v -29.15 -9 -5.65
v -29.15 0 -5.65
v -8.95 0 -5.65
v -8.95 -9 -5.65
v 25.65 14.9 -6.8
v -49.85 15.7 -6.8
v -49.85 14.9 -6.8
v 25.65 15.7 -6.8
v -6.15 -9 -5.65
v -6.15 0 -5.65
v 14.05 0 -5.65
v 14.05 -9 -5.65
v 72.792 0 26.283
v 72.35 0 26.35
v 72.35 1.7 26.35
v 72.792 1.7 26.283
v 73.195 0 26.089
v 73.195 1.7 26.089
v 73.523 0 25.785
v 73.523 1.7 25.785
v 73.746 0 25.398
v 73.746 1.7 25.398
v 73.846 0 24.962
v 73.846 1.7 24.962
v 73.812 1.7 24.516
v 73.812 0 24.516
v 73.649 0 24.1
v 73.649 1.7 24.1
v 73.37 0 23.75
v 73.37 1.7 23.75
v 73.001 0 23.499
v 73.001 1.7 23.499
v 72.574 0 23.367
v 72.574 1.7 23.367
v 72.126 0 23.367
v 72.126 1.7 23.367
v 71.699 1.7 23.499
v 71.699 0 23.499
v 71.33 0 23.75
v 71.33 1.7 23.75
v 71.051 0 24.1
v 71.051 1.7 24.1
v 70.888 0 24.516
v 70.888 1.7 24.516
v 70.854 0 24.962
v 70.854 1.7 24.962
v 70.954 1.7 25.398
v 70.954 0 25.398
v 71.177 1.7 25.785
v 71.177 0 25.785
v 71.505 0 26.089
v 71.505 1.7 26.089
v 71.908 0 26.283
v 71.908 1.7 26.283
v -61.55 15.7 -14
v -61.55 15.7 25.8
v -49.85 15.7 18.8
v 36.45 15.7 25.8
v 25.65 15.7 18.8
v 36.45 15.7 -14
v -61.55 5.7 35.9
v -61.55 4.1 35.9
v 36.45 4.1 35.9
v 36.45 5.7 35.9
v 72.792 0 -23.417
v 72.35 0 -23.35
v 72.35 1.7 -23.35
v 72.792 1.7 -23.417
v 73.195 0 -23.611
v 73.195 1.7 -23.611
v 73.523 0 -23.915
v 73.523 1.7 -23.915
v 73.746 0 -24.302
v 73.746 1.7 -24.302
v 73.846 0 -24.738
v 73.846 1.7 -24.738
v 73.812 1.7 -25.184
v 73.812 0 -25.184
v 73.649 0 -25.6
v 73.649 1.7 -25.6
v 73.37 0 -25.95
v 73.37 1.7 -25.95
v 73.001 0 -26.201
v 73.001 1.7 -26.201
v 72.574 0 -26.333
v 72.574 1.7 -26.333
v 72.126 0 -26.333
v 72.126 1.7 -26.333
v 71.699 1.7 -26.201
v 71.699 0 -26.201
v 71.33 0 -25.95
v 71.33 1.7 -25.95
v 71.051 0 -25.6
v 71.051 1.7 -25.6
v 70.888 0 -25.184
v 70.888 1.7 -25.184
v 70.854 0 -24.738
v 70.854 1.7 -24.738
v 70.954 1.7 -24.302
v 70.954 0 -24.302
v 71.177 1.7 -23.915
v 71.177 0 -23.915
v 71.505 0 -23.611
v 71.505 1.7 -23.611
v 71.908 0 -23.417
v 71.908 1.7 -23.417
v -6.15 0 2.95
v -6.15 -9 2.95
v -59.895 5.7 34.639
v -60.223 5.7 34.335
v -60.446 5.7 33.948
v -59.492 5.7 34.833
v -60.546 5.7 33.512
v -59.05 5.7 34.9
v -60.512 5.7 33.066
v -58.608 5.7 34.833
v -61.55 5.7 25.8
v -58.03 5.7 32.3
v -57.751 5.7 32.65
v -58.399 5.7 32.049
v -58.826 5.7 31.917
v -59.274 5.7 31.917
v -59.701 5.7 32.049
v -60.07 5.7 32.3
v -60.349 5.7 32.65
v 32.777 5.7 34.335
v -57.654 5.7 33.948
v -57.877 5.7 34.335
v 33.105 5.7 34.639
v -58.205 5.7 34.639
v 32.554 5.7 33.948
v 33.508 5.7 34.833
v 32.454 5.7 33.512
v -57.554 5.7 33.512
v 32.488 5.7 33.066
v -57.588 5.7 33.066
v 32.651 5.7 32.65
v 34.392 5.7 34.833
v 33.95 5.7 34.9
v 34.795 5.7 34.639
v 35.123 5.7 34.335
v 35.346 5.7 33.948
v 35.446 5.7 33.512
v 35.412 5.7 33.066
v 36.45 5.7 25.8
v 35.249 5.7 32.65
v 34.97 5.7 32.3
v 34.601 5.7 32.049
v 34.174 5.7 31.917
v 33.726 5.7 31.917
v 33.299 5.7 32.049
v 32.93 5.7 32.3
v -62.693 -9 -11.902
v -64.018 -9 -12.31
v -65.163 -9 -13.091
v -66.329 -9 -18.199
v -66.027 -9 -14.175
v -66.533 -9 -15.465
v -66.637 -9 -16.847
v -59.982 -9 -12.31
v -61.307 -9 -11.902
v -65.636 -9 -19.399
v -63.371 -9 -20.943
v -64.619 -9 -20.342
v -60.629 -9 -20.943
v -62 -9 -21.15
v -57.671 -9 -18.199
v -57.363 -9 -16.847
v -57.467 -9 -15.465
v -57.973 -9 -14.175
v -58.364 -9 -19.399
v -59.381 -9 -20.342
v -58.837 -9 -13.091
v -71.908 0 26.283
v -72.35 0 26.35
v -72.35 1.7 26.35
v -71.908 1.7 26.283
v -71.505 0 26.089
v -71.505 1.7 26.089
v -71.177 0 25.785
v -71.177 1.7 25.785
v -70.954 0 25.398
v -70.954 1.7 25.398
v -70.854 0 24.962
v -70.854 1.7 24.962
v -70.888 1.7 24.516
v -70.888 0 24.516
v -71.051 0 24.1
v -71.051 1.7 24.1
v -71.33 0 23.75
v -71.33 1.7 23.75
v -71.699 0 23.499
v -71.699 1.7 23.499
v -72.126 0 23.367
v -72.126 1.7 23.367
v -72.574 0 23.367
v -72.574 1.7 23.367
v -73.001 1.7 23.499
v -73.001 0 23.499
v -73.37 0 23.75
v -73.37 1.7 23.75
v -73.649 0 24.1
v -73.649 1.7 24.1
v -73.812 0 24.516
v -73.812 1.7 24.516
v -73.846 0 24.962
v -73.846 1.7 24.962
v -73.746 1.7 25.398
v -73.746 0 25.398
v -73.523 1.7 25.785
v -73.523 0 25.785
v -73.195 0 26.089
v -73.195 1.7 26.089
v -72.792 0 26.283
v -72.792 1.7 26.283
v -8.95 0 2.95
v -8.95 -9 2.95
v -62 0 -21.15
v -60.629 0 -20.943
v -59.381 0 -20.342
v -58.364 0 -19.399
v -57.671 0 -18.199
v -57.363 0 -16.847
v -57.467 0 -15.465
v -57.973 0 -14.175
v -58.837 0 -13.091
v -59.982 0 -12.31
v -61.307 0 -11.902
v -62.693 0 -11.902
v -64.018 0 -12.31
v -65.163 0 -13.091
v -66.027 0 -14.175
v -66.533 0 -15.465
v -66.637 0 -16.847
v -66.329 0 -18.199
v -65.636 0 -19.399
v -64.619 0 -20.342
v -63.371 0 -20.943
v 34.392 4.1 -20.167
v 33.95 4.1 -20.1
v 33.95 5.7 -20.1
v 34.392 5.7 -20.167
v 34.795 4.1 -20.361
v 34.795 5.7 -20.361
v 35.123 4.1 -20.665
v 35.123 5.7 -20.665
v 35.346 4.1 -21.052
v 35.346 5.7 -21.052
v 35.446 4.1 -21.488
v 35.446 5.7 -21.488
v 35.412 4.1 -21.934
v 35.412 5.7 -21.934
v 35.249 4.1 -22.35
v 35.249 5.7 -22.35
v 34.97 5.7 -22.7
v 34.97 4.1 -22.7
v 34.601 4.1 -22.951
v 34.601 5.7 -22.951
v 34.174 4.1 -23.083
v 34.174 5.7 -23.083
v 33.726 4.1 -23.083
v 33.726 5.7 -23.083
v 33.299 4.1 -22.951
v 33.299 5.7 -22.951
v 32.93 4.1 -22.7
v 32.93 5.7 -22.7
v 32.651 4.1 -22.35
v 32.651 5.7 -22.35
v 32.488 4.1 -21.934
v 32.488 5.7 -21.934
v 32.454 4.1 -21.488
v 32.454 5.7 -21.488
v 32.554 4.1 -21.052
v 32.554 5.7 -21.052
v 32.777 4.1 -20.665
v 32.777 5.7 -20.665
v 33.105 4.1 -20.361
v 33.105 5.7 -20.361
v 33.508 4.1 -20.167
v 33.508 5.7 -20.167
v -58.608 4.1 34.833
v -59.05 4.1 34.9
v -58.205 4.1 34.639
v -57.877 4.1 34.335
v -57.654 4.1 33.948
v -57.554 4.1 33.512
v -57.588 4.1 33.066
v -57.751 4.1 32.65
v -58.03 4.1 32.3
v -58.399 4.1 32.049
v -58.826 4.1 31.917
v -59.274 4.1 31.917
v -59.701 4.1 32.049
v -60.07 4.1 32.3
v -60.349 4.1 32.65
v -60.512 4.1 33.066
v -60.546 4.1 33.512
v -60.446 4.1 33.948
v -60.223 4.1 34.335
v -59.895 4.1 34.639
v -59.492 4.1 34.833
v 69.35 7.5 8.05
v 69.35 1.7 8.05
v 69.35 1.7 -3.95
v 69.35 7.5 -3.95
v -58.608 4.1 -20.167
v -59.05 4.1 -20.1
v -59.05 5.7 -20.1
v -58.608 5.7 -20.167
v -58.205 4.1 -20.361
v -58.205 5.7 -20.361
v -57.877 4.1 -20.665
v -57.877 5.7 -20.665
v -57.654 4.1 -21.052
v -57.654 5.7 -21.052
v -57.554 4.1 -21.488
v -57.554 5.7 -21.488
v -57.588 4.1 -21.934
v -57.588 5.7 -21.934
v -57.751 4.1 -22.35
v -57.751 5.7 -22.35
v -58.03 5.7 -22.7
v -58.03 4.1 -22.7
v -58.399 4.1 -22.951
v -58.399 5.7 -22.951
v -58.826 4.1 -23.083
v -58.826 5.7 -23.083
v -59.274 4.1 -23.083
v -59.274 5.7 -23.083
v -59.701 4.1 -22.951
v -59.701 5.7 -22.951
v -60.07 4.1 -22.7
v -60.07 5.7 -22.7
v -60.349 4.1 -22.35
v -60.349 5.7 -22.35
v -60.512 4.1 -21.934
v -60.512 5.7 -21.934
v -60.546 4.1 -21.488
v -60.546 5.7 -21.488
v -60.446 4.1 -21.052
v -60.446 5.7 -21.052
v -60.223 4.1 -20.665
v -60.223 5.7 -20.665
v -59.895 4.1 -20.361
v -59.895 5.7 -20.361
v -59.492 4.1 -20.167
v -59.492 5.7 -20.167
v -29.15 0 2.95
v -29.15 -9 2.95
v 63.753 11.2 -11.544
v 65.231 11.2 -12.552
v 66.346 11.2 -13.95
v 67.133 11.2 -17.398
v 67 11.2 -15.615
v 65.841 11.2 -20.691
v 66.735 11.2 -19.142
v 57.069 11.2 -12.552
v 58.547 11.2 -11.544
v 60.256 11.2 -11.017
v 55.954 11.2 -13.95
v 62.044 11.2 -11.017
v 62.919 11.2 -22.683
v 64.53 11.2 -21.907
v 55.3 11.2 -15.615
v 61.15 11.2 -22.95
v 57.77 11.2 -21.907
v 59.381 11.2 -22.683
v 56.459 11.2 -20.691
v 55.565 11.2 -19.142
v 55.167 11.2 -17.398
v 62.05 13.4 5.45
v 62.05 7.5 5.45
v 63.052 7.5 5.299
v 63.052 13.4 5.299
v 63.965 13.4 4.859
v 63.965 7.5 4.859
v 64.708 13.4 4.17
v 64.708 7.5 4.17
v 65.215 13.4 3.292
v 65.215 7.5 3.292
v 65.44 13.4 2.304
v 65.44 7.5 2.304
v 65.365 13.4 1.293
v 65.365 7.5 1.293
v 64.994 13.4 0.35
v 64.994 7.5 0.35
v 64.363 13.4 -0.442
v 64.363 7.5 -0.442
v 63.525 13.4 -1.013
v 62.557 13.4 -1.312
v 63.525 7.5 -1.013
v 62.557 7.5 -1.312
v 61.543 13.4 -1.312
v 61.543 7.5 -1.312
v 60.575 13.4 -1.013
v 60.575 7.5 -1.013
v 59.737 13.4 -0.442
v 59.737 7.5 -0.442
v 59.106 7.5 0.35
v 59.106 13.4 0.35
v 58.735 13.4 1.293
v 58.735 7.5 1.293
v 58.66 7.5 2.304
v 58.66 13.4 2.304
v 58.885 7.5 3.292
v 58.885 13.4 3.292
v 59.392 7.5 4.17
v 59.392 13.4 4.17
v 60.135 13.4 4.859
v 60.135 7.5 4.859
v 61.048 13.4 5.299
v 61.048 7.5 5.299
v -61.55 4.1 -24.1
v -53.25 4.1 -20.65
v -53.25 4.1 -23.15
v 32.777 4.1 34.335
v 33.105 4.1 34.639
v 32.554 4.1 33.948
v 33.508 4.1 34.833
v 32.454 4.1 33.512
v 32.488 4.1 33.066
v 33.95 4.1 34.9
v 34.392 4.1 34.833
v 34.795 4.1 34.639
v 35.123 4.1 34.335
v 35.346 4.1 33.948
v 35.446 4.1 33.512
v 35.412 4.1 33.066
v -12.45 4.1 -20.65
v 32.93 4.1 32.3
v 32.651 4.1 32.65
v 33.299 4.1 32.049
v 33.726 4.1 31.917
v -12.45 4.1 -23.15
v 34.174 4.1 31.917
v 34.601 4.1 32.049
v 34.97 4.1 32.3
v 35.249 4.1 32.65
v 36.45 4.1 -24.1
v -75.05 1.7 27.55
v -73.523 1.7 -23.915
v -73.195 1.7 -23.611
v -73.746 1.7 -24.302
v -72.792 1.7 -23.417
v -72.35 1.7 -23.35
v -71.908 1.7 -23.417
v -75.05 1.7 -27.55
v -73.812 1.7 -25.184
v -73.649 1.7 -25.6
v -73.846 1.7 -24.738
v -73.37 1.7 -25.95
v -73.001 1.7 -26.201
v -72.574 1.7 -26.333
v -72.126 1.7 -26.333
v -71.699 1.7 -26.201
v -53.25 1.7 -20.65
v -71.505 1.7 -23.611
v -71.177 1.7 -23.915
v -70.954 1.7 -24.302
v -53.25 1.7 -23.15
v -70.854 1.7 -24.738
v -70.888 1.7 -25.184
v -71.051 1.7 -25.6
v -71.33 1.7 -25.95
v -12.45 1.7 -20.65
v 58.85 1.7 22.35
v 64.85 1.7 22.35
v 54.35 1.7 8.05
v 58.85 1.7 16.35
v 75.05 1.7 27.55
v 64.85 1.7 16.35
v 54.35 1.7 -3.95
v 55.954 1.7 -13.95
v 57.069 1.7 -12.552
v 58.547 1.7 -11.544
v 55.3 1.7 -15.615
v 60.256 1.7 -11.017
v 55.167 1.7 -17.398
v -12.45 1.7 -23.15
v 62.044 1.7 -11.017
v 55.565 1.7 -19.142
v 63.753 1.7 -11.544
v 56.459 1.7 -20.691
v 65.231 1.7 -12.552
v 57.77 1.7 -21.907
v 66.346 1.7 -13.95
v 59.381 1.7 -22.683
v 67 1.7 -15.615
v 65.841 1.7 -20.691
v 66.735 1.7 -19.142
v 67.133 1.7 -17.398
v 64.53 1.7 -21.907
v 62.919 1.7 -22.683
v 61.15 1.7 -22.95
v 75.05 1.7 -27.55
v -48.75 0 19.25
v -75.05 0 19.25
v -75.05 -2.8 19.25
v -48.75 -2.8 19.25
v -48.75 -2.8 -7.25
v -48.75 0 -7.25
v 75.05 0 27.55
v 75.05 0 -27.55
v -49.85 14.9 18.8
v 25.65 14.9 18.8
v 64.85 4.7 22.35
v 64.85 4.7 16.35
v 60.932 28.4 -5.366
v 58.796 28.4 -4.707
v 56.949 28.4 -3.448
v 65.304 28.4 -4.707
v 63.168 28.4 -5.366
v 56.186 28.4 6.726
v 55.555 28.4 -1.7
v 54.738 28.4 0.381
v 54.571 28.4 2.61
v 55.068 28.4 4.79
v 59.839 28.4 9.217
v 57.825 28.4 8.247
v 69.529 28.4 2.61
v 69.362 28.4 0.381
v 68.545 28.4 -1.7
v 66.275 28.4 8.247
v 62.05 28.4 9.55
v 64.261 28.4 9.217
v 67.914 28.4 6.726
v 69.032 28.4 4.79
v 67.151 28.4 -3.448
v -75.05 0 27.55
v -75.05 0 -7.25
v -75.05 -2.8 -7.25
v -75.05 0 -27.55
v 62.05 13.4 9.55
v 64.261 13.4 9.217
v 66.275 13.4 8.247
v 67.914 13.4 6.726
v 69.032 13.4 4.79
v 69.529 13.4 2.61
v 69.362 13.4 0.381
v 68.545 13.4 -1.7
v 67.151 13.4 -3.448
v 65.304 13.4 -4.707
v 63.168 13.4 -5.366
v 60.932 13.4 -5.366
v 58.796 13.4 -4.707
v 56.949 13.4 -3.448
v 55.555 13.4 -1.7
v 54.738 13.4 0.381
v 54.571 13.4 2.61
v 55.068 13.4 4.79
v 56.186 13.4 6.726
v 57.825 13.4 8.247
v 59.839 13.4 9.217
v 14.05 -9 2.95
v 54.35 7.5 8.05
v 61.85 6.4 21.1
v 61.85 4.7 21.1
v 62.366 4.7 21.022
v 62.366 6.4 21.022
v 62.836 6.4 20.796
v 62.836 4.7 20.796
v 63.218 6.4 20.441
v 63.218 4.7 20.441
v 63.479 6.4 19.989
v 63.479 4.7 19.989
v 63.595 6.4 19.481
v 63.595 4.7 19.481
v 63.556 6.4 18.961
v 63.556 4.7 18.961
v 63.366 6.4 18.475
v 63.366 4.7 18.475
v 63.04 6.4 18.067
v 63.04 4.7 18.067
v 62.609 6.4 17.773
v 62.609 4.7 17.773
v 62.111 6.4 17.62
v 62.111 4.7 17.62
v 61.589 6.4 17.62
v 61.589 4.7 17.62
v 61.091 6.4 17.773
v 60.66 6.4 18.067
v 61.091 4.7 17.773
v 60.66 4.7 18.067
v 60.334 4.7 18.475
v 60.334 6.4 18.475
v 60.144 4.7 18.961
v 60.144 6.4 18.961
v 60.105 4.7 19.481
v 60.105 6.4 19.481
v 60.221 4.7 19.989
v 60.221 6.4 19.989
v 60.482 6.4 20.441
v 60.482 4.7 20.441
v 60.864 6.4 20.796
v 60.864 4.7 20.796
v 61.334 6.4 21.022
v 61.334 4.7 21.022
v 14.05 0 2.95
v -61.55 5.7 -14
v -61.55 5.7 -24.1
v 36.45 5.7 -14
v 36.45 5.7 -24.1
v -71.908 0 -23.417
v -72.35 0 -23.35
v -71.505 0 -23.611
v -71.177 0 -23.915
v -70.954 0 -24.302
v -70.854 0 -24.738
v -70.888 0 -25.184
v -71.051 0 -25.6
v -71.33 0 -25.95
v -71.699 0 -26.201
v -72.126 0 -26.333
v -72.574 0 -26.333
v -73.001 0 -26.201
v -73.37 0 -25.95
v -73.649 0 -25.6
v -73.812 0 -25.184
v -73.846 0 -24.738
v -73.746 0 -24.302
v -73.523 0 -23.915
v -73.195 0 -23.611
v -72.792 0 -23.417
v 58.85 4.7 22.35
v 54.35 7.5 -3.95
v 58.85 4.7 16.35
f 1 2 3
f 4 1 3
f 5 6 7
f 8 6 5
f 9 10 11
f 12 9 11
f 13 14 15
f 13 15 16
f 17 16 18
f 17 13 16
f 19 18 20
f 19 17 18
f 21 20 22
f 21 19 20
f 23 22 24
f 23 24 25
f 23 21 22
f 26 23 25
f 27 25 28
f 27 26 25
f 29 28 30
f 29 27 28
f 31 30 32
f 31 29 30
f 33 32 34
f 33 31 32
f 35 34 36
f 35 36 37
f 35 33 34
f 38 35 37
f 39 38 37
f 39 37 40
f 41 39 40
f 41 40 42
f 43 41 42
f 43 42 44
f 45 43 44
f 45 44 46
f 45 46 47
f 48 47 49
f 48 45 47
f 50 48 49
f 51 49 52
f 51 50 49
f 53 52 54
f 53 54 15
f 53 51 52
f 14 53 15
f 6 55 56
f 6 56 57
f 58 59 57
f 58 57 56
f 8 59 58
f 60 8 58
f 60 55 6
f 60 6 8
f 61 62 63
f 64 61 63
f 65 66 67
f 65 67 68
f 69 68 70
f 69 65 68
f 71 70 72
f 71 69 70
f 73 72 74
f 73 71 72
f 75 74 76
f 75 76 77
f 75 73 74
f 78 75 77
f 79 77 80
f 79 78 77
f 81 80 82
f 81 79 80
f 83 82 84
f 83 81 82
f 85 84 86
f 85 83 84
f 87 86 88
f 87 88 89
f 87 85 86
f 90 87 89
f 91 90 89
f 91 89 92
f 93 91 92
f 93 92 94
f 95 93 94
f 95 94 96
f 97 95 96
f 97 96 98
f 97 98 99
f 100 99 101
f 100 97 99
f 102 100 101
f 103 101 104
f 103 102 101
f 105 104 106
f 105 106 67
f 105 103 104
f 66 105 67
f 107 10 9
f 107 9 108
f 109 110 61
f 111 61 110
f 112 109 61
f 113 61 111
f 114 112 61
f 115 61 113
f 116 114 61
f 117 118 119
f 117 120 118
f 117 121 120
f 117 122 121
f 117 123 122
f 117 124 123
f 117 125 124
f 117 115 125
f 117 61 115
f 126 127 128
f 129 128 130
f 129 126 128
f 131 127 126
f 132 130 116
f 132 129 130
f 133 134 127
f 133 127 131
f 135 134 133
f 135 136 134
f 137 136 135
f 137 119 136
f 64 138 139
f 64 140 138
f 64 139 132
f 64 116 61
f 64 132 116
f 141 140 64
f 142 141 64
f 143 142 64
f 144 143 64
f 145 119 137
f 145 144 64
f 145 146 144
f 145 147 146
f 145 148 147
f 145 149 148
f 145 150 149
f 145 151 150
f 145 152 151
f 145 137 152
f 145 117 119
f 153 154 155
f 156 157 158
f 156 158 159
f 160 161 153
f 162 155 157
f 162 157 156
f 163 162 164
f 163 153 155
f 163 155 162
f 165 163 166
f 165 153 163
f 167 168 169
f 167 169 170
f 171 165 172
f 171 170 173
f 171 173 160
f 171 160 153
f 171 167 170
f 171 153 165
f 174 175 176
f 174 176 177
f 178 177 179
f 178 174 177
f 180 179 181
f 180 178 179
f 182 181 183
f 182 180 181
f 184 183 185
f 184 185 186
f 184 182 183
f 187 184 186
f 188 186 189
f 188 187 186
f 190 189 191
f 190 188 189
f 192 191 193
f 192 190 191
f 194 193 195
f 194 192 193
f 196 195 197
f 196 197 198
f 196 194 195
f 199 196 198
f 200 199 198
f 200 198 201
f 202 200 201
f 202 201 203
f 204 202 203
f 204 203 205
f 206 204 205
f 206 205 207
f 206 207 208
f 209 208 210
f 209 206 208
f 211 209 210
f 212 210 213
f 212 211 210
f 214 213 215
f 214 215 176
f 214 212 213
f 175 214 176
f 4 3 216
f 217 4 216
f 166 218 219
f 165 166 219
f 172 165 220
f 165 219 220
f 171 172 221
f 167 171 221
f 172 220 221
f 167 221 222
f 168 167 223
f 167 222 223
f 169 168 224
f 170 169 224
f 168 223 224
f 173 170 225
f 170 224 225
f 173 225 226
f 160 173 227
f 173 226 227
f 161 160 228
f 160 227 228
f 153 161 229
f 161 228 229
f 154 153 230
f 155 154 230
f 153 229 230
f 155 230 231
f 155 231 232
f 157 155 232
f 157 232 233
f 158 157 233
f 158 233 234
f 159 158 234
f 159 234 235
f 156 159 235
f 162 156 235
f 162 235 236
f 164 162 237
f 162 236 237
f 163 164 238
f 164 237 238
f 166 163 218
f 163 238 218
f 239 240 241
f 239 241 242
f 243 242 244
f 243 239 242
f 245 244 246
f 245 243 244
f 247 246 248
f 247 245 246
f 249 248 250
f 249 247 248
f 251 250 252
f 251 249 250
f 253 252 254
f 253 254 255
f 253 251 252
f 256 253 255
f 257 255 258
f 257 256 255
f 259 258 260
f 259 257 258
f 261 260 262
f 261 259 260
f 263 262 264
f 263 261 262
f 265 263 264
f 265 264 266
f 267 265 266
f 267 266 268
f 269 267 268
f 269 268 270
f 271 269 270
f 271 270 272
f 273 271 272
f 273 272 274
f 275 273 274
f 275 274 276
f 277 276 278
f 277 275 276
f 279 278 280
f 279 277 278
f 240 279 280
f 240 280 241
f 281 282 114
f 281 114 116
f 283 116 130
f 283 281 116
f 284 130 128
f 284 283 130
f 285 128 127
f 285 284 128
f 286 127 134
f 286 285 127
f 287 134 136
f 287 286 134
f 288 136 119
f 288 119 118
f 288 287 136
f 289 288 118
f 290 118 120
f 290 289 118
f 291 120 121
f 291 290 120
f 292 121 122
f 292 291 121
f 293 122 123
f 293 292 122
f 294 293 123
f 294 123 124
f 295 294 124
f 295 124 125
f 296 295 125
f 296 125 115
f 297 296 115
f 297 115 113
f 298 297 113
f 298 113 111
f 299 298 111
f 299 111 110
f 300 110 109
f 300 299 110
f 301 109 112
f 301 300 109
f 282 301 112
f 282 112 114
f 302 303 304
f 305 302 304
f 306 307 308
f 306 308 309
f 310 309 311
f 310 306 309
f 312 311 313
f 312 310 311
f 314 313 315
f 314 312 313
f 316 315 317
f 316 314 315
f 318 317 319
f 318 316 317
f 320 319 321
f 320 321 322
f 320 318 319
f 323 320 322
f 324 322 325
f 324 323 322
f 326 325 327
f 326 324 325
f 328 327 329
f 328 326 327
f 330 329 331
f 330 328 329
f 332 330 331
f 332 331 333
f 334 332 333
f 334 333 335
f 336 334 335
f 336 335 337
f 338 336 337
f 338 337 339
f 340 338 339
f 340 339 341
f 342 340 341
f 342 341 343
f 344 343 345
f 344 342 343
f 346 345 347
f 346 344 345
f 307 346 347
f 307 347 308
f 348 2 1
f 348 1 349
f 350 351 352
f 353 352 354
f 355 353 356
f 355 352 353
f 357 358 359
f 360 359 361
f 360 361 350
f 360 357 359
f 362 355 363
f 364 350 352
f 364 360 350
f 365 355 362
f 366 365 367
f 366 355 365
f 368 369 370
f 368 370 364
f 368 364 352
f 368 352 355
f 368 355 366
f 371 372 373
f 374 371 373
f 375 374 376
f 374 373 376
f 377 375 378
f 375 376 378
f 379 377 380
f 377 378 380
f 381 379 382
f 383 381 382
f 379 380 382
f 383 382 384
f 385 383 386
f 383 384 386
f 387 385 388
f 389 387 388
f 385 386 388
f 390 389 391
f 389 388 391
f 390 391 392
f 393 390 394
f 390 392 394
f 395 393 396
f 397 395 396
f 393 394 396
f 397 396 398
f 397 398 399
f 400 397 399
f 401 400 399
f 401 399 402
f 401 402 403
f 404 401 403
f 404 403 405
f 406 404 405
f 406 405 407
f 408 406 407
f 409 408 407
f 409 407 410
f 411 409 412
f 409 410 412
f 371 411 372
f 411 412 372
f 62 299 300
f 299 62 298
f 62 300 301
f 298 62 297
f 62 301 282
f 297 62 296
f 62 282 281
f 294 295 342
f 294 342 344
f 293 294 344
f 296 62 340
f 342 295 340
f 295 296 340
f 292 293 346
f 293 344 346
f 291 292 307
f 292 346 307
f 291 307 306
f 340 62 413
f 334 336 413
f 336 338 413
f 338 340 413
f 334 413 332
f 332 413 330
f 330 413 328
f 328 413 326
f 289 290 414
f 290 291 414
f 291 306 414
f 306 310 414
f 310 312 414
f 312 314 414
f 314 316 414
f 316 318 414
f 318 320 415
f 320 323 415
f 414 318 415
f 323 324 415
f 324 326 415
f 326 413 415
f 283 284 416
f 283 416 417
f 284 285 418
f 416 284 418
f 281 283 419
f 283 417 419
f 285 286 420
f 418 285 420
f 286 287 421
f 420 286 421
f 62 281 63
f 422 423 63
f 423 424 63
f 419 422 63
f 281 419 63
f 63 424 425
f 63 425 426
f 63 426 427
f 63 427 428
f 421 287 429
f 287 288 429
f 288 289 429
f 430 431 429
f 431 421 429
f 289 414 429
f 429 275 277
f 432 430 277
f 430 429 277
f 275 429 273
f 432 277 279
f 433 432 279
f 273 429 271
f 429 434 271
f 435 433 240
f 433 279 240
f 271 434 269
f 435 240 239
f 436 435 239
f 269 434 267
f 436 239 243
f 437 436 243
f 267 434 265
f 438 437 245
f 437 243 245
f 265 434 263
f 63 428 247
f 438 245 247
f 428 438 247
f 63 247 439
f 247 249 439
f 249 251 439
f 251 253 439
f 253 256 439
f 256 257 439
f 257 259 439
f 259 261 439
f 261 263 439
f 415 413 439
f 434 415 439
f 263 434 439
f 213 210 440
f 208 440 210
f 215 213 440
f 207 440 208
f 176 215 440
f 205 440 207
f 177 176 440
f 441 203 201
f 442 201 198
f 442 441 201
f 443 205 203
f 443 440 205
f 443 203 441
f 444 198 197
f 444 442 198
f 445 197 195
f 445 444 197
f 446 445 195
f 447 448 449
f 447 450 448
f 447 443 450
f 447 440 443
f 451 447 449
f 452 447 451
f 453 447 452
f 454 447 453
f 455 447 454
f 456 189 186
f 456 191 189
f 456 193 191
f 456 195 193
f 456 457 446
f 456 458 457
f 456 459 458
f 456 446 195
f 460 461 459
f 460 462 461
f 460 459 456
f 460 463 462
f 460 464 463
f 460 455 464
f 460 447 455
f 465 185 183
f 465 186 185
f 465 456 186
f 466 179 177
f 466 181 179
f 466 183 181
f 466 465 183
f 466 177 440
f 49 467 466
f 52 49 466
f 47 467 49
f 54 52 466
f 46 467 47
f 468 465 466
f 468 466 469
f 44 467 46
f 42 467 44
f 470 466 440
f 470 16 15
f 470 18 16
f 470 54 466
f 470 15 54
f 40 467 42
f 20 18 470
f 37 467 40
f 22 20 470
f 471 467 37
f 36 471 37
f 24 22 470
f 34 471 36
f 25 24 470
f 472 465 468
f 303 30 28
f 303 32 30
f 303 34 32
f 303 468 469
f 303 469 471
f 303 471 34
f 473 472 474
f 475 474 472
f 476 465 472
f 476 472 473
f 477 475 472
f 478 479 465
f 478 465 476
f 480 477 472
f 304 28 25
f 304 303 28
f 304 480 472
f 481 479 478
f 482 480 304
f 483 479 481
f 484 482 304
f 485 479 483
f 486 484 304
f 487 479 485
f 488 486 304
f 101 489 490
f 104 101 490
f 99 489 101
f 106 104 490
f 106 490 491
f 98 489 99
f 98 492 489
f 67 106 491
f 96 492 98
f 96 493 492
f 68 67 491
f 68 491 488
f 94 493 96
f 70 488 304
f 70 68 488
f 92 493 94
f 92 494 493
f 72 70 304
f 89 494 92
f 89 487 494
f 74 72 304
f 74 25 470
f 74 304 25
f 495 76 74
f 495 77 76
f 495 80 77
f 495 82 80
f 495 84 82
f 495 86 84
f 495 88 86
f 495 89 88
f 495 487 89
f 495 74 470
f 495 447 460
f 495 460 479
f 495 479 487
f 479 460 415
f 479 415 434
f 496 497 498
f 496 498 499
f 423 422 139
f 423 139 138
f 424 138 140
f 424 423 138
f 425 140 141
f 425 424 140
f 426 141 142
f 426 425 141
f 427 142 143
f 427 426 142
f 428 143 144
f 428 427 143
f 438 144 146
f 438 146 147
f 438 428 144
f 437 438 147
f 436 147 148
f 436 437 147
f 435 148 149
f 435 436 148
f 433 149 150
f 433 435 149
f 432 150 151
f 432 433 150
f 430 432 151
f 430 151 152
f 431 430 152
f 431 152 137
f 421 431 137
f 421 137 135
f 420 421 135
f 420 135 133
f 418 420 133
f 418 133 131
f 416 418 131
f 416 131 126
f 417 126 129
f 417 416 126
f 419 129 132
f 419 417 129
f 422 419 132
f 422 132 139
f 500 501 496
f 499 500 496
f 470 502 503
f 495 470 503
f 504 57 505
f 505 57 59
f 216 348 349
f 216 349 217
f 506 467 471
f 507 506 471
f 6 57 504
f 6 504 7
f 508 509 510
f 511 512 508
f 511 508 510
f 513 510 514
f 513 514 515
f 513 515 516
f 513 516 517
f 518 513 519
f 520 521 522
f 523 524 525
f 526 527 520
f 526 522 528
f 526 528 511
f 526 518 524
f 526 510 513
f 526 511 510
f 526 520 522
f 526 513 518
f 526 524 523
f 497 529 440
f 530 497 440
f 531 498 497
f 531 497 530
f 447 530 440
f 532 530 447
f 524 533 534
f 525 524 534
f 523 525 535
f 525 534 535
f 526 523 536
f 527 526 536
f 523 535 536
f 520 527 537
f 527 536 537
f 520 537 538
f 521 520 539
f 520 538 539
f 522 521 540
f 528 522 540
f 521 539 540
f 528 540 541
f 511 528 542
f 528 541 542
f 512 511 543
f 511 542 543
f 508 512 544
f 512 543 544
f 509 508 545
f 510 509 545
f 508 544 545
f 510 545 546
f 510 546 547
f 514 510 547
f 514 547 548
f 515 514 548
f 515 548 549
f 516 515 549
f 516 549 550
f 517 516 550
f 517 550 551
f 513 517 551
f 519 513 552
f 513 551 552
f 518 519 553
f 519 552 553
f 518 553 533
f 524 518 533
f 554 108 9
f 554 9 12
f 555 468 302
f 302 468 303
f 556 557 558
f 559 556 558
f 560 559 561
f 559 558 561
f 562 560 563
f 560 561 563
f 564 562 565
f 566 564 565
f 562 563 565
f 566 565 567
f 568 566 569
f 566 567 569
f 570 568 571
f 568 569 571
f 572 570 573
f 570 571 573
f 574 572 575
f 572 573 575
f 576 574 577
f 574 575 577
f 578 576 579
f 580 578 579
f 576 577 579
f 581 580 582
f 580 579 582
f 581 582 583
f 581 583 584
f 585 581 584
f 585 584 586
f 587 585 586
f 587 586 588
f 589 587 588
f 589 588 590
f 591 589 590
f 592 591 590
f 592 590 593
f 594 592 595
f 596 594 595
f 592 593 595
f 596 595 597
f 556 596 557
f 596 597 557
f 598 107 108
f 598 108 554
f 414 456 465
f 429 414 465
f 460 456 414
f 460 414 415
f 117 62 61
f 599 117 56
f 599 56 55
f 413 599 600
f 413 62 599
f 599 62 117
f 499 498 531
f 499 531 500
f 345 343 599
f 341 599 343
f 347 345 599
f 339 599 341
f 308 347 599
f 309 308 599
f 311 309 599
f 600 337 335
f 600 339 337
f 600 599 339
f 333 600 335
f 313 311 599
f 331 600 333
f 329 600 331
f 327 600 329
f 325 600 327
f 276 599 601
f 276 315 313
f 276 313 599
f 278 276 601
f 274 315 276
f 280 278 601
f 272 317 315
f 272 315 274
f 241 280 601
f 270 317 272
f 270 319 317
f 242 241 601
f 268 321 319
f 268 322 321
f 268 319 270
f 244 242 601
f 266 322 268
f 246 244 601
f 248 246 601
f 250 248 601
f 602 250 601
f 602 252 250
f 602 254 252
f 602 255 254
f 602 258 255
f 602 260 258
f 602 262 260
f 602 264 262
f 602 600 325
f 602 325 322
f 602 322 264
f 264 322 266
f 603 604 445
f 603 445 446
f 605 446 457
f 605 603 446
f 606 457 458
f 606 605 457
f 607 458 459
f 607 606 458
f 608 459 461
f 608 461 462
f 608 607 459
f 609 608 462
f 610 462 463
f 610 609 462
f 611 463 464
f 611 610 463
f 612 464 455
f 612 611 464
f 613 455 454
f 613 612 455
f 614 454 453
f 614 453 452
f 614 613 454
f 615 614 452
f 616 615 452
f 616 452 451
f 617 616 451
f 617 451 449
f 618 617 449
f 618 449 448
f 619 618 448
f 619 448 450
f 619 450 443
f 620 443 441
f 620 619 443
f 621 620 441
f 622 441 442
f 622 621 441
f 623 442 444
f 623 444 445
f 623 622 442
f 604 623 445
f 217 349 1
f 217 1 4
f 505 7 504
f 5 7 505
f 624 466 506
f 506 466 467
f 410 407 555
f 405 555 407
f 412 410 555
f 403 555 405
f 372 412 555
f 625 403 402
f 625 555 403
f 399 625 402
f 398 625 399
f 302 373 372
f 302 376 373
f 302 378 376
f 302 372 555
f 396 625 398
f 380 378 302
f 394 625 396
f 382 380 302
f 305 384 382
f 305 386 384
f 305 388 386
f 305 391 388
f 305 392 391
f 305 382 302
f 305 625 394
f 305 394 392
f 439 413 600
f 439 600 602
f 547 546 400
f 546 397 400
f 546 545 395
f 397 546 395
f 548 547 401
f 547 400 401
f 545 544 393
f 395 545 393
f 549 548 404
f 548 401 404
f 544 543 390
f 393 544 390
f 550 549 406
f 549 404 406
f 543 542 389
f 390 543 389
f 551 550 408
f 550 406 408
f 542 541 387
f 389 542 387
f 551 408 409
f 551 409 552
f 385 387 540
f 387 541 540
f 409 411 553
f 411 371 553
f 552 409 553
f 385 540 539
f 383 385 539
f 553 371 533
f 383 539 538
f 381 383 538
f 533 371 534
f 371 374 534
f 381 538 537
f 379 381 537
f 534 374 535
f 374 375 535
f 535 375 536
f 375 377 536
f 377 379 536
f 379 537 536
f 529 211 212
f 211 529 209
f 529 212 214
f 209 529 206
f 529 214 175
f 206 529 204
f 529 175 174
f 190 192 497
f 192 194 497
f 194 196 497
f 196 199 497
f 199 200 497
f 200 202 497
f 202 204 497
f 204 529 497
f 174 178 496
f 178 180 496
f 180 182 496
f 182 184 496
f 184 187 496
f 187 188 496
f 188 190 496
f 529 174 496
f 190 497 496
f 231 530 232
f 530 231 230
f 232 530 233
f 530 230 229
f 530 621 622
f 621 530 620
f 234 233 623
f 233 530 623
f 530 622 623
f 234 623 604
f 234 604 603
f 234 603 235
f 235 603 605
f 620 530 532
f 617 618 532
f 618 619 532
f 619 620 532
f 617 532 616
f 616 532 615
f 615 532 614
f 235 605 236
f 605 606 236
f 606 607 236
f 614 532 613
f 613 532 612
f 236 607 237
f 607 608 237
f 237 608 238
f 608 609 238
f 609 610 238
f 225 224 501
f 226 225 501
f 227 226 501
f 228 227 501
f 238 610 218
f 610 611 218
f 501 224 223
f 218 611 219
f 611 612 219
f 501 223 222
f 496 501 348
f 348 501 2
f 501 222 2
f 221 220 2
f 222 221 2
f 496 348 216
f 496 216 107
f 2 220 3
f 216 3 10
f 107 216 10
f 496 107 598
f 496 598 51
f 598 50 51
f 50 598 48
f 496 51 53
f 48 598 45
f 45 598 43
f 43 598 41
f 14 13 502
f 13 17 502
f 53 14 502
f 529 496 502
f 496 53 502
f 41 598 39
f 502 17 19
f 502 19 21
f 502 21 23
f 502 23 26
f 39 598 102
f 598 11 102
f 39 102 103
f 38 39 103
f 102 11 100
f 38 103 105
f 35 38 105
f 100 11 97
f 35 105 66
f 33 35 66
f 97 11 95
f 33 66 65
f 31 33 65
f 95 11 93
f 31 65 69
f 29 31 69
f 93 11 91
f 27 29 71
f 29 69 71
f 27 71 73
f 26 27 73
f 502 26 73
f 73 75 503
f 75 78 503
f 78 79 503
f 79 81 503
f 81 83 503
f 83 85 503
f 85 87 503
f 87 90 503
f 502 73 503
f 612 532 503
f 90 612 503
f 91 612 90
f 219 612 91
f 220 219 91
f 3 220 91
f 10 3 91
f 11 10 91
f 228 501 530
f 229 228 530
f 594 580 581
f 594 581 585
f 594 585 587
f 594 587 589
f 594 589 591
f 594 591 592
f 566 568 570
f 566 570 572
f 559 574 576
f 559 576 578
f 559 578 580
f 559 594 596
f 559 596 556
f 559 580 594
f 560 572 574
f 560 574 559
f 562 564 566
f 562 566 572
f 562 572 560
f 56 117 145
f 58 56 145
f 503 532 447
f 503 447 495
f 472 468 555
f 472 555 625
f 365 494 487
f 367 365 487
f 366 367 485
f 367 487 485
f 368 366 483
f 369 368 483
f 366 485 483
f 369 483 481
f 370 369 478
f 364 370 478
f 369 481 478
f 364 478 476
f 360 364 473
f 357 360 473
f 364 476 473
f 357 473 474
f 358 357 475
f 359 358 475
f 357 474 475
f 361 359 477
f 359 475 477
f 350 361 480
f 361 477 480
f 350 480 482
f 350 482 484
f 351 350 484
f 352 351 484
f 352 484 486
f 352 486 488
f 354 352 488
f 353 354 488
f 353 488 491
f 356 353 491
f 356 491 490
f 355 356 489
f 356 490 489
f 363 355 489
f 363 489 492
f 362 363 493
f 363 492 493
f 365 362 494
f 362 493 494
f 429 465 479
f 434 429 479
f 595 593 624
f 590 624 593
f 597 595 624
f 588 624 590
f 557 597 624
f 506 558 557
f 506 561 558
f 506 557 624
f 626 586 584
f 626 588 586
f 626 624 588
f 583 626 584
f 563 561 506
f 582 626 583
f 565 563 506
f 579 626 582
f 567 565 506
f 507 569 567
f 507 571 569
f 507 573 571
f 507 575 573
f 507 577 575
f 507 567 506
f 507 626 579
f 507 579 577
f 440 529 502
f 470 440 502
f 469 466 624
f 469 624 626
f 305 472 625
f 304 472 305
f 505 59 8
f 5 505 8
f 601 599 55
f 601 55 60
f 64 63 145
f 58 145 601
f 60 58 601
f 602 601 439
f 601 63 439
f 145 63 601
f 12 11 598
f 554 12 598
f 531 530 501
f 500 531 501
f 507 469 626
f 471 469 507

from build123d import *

# Parameters (mm, degrees)
SKETCH1_W            = 150.1
SKETCH1_H            = 55.1
SKETCH1_R            = 1.5
BOSS_EXTRUDE1_DEPTH  = 1.7
SKETCH2_W            = 40.8
SKETCH2_H            = 2.5
BOSS_EXTRUDE2_DEPTH  = 2.4
SKETCH3_W            = 98
SKETCH3_H            = 60
SKETCH3_R            = 1.5
BOSS_EXTRUDE3_DEPTH  = 1.6
SKETCH4_W            = 98
SKETCH4_H            = 39.8
BOSS_EXTRUDE4_DEPTH  = 10
SKETCH5_W            = 75.5
SKETCH5_H            = 25.6
CUT_EXTRUDE1_DEPTH   = 0.8
SKETCH6_R            = 6
BOSS_EXTRUDE5_DEPTH  = 9.5
SKETCH7_W            = 6
SKETCH7_H            = 6
BOSS_EXTRUDE6_DEPTH  = 3
SKETCH8_R            = 1.75
BOSS_EXTRUDE7_DEPTH  = 1.7
SKETCH9_W            = 26.3
SKETCH9_H            = 26.5
BOSS_EXTRUDE8_DEPTH  = 2.8
SKETCH10_W           = 20.2
SKETCH10_H           = 8.6
BOSS_EXTRUDE9_DEPTH  = 9
SKETCH11_R           = 4.65
BOSS_EXTRUDE10_DEPTH = 9
SKETCH12_W           = 15
SKETCH12_H           = 12
BOSS_EXTRUDE11_DEPTH = 5.8
SKETCH13_R           = 3.4
BOSS_EXTRUDE12_DEPTH = 5.9
SKETCH14_R           = 7.5
BOSS_EXTRUDE13_DEPTH = 15


with BuildPart() as part:
    # Sketch1 → Boss-Extrude1 (new body)
    with BuildSketch(Plane(origin=(0, 0, 0), x_dir=(1, 0, 0), z_dir=(0, 1, 0))):
        Rectangle(SKETCH1_W, SKETCH1_H)
        with Locations(Location((-72.35, 24.85, 0), (0, 0, 270))):
            Circle(SKETCH1_R, mode=Mode.SUBTRACT)
        with Locations(Location((-72.35, -24.85, 0), (0, 0, 270))):
            Circle(SKETCH1_R, mode=Mode.SUBTRACT)
        with Locations(Location((72.35, 24.85, 0), (0, 0, 270))):
            Circle(SKETCH1_R, mode=Mode.SUBTRACT)
        with Locations(Location((72.35, -24.85, 0), (0, 0, 270))):
            Circle(SKETCH1_R, mode=Mode.SUBTRACT)
    extrude(amount=BOSS_EXTRUDE1_DEPTH)

    # Sketch2 → Boss-Extrude2 (add)
    with BuildSketch(Plane(origin=(0, 1.7, 0), x_dir=(1, 0, 0), z_dir=(0, 1, 0))):
        with Locations((-32.85, 21.9)):
            Rectangle(SKETCH2_W, SKETCH2_H)
    extrude(amount=BOSS_EXTRUDE2_DEPTH)

    # Sketch3 → Boss-Extrude3 (add)
    with BuildSketch(Plane(origin=(0, 4.1, 0), x_dir=(1, 0, 0), z_dir=(0, 1, 0))):
        with Locations((-12.55, -5.9)):
            Rectangle(SKETCH3_W, SKETCH3_H)
        with Locations(Location((-59.05, 21.6, 0), (0, 0, 270))):
            Circle(SKETCH3_R, mode=Mode.SUBTRACT)
        with Locations(Location((33.95, 21.6, 0), (0, 0, 270))):
            Circle(SKETCH3_R, mode=Mode.SUBTRACT)
        with Locations(Location((33.95, -33.4, 0), (0, 0, 270))):
            Circle(SKETCH3_R, mode=Mode.SUBTRACT)
        with Locations(Location((-59.05, -33.4, 0), (0, 0, 270))):
            Circle(SKETCH3_R, mode=Mode.SUBTRACT)
    extrude(amount=BOSS_EXTRUDE3_DEPTH)

    # Sketch4 → Boss-Extrude4 (add)
    with BuildSketch(Plane(origin=(0, 5.7, 0), x_dir=(1, 0, 0), z_dir=(0, 1, 0))):
        with Locations((-12.55, -5.9)):
            Rectangle(SKETCH4_W, SKETCH4_H)
    extrude(amount=BOSS_EXTRUDE4_DEPTH)

    # Sketch5 → Cut-Extrude1 (cut)
    with BuildSketch(Plane(origin=(0, 15.7, 0), x_dir=(1, 0, 0), z_dir=(0, 1, 0))):
        with Locations((-12.1, -6)):
            Rectangle(SKETCH5_W, SKETCH5_H)
    extrude(amount=-CUT_EXTRUDE1_DEPTH, mode=Mode.SUBTRACT)

    # Sketch6 → Boss-Extrude5 (add)
    with BuildSketch(Plane(origin=(0, 1.7, 0), x_dir=(1, 0, 0), z_dir=(0, 1, 0))):
        with Locations(Location((61.15, 16.95, 0), (0, 0, 90))):
            Circle(SKETCH6_R)
    extrude(amount=BOSS_EXTRUDE5_DEPTH)

    # Sketch7 → Boss-Extrude6 (add)
    with BuildSketch(Plane(origin=(0, 1.7, 0), x_dir=(1, 0, 0), z_dir=(0, 1, 0))):
        with Locations((61.85, -19.35)):
            Rectangle(SKETCH7_W, SKETCH7_H)
    extrude(amount=BOSS_EXTRUDE6_DEPTH)

    # Sketch8 → Boss-Extrude7 (add)
    with BuildSketch(Plane(origin=(0, 4.7, 0), x_dir=(1, 0, 0), z_dir=(0, 1, 0))):
        with Locations(Location((61.85, -19.35, 0), (0, 0, 270))):
            Circle(SKETCH8_R)
    extrude(amount=BOSS_EXTRUDE7_DEPTH)

    # Sketch9 → Boss-Extrude8 (add)
    with BuildSketch(Plane.XZ):
        with Locations((-61.9, 6)):
            Rectangle(SKETCH9_W, SKETCH9_H)
    extrude(amount=BOSS_EXTRUDE8_DEPTH)

    # Sketch10 → Boss-Extrude9 (add)
    with BuildSketch(Plane.XZ):
        with Locations((3.95, -1.35)):
            Rectangle(SKETCH10_W, SKETCH10_H)
        with Locations((-19.05, -1.35)):
            Rectangle(SKETCH10_W, SKETCH10_H)
    extrude(amount=BOSS_EXTRUDE9_DEPTH)

    # Sketch11 → Boss-Extrude10 (add)
    with BuildSketch(Plane.XZ):
        with Locations(Location((-62, -16.5, 0), (0, 0, 270))):
            Circle(SKETCH11_R)
    extrude(amount=BOSS_EXTRUDE10_DEPTH)

    # Sketch12 → Boss-Extrude11 (add)
    with BuildSketch(Plane(origin=(0, 1.7, 0), x_dir=(1, 0, 0), z_dir=(0, 1, 0))):
        with Locations((61.85, -2.05)):
            Rectangle(SKETCH12_W, SKETCH12_H)
    extrude(amount=BOSS_EXTRUDE11_DEPTH)

    # Sketch13 → Boss-Extrude12 (add)
    with BuildSketch(Plane(origin=(0, 7.5, 0), x_dir=(1, 0, 0), z_dir=(0, 1, 0))):
        with Locations(Location((62.05, -2.05, 0), (0, 0, 270))):
            Circle(SKETCH13_R)
    extrude(amount=BOSS_EXTRUDE12_DEPTH)

    # Sketch14 → Boss-Extrude13 (add)
    with BuildSketch(Plane(origin=(0, 13.4, 0), x_dir=(1, 0, 0), z_dir=(0, 1, 0))):
        with Locations(Location((62.05, -2.05, 0), (0, 0, 270))):
            Circle(SKETCH14_R)
    extrude(amount=BOSS_EXTRUDE13_DEPTH)


solid = part.part
